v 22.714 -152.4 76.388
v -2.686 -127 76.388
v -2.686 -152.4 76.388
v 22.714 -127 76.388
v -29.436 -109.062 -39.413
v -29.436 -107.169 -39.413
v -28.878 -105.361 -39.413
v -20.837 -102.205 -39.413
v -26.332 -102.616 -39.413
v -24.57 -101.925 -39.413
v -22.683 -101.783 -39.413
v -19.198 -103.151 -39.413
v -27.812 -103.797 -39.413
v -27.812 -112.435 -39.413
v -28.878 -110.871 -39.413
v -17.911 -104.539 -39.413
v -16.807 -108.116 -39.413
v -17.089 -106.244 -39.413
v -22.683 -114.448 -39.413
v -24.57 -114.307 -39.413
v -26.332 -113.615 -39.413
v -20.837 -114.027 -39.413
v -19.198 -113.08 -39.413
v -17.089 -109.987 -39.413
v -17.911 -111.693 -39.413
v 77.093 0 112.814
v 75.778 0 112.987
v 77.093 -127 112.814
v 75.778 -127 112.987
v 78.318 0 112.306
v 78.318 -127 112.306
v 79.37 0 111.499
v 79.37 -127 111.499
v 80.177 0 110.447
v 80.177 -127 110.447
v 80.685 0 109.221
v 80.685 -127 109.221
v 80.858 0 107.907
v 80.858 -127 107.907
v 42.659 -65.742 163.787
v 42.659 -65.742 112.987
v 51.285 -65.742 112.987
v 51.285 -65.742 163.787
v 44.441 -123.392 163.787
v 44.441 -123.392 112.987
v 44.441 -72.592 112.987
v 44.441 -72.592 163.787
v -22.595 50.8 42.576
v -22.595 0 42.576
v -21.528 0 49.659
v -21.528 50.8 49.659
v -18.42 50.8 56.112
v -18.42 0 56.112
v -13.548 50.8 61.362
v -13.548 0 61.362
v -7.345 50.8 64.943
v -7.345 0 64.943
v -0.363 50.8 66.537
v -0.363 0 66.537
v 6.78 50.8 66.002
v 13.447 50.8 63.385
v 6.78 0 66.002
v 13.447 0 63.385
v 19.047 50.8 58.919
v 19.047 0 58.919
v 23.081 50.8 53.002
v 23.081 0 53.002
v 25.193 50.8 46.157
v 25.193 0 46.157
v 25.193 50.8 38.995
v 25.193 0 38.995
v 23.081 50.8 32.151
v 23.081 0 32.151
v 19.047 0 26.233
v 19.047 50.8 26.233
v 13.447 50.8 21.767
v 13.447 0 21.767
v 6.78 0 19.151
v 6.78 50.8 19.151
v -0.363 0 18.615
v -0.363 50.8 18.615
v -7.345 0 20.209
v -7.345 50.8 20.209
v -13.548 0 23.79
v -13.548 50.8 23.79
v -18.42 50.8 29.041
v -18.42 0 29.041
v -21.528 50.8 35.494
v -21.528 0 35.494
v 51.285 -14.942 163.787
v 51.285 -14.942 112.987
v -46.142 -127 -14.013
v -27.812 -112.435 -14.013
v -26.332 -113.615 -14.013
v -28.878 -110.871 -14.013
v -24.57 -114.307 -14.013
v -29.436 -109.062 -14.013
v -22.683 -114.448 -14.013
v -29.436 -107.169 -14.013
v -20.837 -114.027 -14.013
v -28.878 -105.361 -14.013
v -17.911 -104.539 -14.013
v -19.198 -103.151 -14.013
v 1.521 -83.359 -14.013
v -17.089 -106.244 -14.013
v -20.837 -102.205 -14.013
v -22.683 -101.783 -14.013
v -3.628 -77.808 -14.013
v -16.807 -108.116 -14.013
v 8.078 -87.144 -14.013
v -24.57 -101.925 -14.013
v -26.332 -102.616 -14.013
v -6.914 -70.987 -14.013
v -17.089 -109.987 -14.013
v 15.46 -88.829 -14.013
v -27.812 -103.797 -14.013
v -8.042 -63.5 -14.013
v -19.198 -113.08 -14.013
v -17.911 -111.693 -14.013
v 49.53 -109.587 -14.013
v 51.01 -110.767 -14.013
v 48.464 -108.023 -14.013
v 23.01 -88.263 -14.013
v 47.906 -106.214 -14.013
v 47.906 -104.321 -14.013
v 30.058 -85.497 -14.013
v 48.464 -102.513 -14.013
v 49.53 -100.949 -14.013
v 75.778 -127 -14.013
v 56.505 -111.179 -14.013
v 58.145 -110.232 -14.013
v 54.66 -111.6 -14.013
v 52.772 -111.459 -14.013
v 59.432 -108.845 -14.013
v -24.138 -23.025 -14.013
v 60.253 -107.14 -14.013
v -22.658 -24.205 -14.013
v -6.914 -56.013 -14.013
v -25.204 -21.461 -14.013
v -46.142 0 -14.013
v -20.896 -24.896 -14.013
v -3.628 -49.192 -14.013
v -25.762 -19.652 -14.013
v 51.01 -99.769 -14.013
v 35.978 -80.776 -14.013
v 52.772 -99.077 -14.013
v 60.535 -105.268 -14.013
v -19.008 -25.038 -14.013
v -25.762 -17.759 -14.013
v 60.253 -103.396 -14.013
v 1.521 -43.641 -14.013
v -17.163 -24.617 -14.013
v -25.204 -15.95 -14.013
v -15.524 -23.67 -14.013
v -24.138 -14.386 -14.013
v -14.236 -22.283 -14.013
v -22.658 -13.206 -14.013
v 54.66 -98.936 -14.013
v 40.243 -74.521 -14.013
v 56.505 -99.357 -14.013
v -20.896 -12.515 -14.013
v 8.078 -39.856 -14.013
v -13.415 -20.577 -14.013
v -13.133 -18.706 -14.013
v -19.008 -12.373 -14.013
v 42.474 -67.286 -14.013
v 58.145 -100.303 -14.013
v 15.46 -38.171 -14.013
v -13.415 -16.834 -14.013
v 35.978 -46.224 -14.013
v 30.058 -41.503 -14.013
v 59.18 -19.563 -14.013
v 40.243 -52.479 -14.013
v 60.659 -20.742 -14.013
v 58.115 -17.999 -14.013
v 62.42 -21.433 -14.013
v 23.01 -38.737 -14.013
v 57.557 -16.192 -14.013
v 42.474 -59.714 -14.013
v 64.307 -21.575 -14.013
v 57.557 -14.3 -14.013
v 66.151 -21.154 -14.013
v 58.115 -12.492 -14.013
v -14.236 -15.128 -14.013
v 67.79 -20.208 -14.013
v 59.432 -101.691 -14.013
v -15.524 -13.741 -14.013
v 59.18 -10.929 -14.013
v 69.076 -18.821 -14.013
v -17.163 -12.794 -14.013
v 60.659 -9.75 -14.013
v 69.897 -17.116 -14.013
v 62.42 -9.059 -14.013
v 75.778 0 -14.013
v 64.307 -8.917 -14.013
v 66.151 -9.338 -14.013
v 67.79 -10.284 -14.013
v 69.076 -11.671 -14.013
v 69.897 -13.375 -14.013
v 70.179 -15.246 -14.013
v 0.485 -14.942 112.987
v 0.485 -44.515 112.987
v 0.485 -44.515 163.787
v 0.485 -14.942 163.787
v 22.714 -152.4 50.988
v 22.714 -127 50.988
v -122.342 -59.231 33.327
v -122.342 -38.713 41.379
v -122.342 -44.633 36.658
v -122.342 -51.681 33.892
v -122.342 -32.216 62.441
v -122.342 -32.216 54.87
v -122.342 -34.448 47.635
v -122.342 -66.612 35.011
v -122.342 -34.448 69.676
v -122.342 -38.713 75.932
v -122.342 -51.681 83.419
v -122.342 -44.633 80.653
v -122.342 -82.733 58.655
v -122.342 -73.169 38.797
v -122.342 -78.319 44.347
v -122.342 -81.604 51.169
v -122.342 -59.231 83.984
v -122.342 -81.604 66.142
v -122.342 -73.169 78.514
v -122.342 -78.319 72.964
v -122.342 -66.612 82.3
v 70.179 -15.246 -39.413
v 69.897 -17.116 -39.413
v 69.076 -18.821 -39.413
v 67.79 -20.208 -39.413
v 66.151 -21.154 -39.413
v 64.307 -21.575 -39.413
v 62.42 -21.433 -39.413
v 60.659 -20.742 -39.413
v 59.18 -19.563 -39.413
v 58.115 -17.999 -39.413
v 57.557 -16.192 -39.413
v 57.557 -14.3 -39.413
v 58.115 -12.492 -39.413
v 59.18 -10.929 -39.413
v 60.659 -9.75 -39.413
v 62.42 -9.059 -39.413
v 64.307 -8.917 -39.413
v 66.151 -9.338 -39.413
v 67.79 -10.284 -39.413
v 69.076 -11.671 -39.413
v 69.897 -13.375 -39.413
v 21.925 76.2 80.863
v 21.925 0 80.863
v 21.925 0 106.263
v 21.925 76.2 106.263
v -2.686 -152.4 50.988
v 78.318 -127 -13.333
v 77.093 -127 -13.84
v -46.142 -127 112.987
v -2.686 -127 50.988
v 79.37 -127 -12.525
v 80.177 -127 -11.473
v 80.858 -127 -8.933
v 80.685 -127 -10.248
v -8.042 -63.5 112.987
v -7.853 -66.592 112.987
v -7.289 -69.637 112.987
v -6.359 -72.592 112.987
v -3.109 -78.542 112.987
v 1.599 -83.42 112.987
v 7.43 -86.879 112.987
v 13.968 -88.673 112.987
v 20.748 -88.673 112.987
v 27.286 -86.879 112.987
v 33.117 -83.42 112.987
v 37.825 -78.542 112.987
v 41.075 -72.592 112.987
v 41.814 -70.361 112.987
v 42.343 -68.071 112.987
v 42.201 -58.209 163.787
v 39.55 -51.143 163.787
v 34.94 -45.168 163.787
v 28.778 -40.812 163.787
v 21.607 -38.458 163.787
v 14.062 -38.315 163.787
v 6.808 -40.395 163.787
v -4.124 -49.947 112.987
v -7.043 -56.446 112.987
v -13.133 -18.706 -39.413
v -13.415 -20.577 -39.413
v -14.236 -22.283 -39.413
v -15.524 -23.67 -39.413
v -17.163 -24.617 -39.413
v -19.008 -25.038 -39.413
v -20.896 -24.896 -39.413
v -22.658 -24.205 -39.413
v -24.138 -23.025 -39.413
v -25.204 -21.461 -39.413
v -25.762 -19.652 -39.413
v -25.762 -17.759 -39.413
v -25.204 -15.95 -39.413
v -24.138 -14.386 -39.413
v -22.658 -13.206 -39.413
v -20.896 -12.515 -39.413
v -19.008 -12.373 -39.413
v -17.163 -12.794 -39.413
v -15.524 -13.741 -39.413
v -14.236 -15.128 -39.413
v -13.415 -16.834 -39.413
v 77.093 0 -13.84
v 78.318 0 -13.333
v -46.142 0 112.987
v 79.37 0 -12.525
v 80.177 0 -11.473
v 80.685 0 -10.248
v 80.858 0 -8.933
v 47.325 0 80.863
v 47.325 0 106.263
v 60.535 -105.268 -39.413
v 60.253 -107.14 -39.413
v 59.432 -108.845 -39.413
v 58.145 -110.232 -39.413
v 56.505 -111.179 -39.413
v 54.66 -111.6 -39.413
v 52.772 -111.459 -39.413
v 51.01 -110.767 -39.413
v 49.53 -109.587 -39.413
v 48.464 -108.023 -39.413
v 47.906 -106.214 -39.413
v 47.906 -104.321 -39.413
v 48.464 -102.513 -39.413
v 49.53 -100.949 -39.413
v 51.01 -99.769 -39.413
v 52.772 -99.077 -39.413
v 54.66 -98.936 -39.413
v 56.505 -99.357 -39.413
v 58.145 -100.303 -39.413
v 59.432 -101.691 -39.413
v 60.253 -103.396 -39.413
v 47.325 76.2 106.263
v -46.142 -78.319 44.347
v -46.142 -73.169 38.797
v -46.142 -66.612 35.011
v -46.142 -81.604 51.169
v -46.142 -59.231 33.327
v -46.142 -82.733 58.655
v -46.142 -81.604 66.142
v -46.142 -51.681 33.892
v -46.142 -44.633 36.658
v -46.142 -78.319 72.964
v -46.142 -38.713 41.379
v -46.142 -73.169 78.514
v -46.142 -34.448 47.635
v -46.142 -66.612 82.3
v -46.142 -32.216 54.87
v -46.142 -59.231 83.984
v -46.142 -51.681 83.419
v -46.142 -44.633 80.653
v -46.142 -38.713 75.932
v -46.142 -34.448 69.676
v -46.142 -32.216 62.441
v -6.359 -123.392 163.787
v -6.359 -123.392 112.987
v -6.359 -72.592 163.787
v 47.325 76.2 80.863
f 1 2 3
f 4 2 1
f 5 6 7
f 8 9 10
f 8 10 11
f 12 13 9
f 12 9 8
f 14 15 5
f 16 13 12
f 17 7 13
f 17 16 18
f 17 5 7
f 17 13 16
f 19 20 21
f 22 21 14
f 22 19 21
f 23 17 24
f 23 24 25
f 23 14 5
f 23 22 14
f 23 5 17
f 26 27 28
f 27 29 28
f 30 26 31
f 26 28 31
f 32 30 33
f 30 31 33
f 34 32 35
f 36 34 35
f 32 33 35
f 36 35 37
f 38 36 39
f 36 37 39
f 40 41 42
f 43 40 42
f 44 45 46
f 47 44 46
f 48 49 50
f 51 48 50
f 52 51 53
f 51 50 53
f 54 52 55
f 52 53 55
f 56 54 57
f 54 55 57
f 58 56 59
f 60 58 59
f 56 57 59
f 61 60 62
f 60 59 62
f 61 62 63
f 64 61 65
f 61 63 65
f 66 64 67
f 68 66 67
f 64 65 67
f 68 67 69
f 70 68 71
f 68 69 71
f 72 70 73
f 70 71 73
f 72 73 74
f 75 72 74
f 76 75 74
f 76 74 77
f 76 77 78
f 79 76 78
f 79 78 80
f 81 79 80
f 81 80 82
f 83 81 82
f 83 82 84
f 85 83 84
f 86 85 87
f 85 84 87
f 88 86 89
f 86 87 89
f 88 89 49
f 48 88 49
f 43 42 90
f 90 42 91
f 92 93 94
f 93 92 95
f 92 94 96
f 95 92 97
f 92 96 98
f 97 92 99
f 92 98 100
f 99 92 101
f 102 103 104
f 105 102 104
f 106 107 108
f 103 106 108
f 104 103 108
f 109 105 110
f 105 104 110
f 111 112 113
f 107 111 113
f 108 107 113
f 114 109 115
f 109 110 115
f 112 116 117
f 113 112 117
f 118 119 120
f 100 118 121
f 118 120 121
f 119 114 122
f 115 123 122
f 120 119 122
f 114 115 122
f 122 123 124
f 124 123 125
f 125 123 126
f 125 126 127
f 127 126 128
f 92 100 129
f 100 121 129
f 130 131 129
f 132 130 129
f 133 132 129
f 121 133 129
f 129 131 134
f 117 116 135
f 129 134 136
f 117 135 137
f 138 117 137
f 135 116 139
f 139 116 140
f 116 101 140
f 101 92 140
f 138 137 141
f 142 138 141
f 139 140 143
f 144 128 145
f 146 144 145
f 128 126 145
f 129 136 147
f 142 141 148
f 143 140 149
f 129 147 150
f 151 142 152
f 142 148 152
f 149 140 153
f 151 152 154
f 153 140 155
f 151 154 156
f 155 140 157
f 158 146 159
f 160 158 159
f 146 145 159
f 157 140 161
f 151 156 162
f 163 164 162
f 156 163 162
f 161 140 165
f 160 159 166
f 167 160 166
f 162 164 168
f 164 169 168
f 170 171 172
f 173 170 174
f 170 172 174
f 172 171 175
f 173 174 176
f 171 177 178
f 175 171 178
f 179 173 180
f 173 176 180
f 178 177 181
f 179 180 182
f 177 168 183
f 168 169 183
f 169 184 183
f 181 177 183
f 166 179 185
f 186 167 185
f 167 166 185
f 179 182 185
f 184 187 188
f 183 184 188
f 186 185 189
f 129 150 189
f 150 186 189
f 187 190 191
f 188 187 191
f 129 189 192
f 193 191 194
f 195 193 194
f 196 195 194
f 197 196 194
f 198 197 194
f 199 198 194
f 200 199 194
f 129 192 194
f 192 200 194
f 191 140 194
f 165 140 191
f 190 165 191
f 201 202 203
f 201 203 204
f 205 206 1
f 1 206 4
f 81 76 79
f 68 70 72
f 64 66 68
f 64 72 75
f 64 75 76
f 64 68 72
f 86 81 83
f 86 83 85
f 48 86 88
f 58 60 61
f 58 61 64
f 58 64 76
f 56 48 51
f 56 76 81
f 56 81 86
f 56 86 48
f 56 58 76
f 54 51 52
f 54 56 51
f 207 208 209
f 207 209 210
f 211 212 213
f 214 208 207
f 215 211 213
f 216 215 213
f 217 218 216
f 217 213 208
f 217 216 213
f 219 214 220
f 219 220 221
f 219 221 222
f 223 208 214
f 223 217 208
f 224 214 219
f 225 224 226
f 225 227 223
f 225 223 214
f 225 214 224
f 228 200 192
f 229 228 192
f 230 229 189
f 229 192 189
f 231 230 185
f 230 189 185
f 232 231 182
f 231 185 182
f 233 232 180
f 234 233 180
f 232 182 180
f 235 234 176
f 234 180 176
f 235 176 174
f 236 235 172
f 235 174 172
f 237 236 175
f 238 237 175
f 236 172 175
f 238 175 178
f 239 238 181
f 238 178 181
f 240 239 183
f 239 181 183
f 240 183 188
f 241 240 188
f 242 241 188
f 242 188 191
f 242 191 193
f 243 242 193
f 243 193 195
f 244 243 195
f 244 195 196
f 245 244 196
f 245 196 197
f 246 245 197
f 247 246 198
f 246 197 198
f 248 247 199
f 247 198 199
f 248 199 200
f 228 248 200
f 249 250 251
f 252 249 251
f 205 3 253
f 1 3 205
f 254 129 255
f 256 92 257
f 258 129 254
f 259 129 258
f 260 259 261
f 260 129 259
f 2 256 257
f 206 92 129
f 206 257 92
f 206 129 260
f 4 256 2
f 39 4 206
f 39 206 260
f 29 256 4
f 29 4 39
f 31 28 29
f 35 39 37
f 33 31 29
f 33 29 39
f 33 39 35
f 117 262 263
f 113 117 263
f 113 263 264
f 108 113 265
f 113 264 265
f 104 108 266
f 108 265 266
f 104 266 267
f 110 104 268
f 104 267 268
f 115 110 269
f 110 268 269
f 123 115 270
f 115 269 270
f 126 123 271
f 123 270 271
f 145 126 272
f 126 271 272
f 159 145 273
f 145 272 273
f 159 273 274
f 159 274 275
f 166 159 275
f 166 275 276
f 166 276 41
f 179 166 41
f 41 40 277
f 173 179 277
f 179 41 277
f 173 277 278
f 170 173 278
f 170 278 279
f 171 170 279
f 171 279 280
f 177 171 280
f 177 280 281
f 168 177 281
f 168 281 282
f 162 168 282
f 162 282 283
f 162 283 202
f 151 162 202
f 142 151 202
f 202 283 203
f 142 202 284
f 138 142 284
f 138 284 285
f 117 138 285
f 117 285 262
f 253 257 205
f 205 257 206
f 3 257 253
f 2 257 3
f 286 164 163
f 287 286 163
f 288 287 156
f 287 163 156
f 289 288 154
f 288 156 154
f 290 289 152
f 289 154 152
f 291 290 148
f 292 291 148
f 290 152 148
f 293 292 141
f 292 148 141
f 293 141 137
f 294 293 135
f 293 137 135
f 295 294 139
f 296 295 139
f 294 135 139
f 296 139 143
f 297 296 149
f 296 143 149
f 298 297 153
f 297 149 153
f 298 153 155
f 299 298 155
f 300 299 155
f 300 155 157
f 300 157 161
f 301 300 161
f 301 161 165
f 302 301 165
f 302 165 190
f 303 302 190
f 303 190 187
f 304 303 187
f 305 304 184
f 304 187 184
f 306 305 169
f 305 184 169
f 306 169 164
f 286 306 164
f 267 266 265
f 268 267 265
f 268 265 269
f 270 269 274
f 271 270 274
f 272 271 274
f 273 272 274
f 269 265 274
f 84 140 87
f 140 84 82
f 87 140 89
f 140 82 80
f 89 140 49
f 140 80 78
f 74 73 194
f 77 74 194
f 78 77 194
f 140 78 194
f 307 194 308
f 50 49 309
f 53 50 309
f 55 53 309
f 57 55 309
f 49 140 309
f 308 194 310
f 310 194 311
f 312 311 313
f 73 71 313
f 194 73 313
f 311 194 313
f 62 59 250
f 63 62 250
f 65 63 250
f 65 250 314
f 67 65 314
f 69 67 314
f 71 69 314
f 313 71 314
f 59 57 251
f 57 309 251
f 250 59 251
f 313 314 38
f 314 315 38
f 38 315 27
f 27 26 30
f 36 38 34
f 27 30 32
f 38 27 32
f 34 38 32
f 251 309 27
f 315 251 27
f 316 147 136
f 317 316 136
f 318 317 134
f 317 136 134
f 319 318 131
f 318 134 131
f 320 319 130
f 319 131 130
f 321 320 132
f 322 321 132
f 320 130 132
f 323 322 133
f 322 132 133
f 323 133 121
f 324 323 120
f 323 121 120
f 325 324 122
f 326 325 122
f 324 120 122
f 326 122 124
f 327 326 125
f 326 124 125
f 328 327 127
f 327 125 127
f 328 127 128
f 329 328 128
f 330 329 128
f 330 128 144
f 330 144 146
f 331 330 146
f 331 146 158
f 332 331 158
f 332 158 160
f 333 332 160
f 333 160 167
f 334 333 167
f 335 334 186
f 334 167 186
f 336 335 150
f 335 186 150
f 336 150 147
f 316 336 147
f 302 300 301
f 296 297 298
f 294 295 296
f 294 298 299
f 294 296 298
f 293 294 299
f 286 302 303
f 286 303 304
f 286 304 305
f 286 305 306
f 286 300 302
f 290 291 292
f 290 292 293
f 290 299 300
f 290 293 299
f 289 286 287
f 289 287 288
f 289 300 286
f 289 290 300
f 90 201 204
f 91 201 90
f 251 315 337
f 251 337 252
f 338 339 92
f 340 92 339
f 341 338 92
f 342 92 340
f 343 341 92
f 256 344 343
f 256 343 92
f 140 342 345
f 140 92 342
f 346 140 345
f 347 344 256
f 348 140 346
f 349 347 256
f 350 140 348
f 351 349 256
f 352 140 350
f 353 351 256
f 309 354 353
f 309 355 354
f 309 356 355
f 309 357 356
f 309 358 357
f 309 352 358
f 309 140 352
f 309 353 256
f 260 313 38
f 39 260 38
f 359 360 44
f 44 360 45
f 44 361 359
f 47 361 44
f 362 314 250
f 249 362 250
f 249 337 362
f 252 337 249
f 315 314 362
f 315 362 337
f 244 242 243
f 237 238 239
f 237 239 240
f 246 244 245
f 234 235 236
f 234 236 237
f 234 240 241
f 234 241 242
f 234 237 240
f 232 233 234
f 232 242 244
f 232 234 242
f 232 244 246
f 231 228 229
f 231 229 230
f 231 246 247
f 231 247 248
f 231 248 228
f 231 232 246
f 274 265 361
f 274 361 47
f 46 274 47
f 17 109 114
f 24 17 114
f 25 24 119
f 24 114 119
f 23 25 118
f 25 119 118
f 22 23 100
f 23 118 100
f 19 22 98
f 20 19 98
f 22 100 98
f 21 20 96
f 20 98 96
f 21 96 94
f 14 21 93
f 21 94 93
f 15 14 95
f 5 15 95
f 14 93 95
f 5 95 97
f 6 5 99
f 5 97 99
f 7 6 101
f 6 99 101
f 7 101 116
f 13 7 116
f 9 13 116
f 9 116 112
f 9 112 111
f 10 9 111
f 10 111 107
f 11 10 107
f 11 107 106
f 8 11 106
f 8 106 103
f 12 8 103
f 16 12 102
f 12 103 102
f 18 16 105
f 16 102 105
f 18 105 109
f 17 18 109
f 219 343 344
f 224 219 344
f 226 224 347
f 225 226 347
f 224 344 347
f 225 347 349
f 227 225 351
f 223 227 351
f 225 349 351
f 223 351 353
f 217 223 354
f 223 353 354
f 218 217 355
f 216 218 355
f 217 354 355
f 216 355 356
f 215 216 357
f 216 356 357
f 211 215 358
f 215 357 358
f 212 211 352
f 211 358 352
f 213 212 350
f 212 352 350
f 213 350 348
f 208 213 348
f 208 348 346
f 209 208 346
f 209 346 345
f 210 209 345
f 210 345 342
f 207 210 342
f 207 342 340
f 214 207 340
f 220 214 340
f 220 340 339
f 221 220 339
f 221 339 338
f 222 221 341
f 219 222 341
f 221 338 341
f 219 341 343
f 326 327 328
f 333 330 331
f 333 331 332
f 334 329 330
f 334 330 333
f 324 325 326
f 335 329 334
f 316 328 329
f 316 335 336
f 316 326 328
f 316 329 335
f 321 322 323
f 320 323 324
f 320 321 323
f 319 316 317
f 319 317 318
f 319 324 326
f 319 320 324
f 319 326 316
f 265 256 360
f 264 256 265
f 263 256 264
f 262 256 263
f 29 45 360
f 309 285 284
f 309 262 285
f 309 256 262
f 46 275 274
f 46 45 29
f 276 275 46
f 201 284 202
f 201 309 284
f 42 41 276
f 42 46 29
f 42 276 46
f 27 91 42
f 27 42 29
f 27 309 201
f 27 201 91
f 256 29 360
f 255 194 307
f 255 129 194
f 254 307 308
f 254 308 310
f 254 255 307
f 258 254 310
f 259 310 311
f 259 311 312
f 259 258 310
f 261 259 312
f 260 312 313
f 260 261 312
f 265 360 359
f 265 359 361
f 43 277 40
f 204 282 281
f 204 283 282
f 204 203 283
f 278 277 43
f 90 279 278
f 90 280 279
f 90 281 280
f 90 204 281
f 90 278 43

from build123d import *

# Parameters (mm, degrees)
F0_W      = 127
F0_H      = 127
F1_DEPTH  = 127
F2_W      = 50.8
F2_H      = 50.8
F3_DEPTH  = 50.8
F4_R      = 25.4
F5_DEPTH  = 76.2
F6_R      = 24.028023
F7_DEPTH  = 50.8
F8_W      = 25.4
F8_H      = 25.4
F9_DEPTH  = 76.2
F11_D     = 50.8
F12_R     = 5.08
F13_W     = 25.4
F13_H     = 25.4
F14_DEPTH = 25.4
F15_R     = 6.35
F17_DEPTH = 25.4
F18_R     = 6.35
F19_DEPTH = 25.4
F20_R     = 6.35
F21_DEPTH = 25.4
F22_R     = 6.346464
F23_DEPTH = 25.4
F24_W     = 50.8
F24_H     = 50.8
F25_DEPTH = 50.8


with BuildPart() as f1:
    # F0 (on Front) → F1 (new body)
    with BuildSketch(Plane.XZ):
        with Locations((17.358025, 49.486642)):
            Rectangle(F0_W, F0_H)
    extrude(amount=F1_DEPTH)

    # F2 (on face) → F3 (join)
    with BuildSketch(Plane.XY.offset(112.986642)):
        with Locations((25.884503, -40.341979)):
            Rectangle(F2_W, F2_H)
    extrude(amount=F3_DEPTH)

    # F4 (on face) → F5 (join)
    with BuildSketch(Plane(origin=(-46.141975, 0, 0), x_dir=(0, -1, 0), z_dir=(-1, 0, 0))):
        with Locations((57.332661, 58.655478)):
            Circle(F4_R)
    extrude(amount=F5_DEPTH)

    # F6 (on face) → F7 (join)
    with BuildSketch(Plane(origin=(0, 0, 0), x_dir=(-1, 0, 0), z_dir=(0, 1, 0))):
        with Locations((-1.432957, 42.57629)):
            Circle(F6_R)
    extrude(amount=F7_DEPTH)

    # F8 (on face) → F9 (join)
    with BuildSketch(Plane(origin=(0, 0, 0), x_dir=(-1, 0, 0), z_dir=(0, 1, 0))):
        with Locations((-34.625011, 93.562656)):
            Rectangle(F8_W, F8_H)
    extrude(amount=F9_DEPTH)

    # F11 (through all)
    with Locations(Plane(origin=(0, 0, -14.013358), x_dir=(1, 0, 0), z_dir=(0, 0, -1))):
        with Locations((17.358025, 63.5)):
            Hole(F11_D / 2)

    # F12
    f12_edges = [f1.edges().sort_by_distance(p)[0] for p in [
        (80.858025, -63.5, -14.013358),
        (80.858025, -63.5, 112.986642),
    ]]
    fillet(f12_edges, radius=F12_R)

    # F13 (on face) → F14 (join)
    with BuildSketch(Plane.XZ.offset(127)):
        with Locations((10.013793, 63.688007)):
            Rectangle(F13_W, F13_H)
    extrude(amount=F14_DEPTH)

    # F15 (on face) → F17 (join)
    with BuildSketch(Plane(origin=(0, 0, -14.013358), x_dir=(1, 0, 0), z_dir=(0, 0, -1))):
        with Locations((-19.482944, 18.705502)):
            Circle(F15_R)
    extrude(amount=F17_DEPTH)

    # F18 (on face) → F19 (join)
    with BuildSketch(Plane(origin=(0, 0, -14.013358), x_dir=(1, 0, 0), z_dir=(0, 0, -1))):
        with Locations((54.185353, 105.267808)):
            Circle(F18_R)
    extrude(amount=F19_DEPTH)

    # F20 (on face) → F21 (join)
    with BuildSketch(Plane(origin=(0, 0, -14.013358), x_dir=(1, 0, 0), z_dir=(0, 0, -1))):
        with Locations((-23.157163, 108.115725)):
            Circle(F20_R)
    extrude(amount=F21_DEPTH)

    # F22 (on face) → F23 (join)
    with BuildSketch(Plane(origin=(0, 0, -14.013358), x_dir=(1, 0, 0), z_dir=(0, 0, -1))):
        with Locations((63.832581, 15.245846)):
            Circle(F22_R)
    extrude(amount=F23_DEPTH)

    # F24 (on face) → F25 (join)
    with BuildSketch(Plane.XY.offset(112.986642)):
        with Locations((19.040968, -97.99182)):
            Rectangle(F24_W, F24_H)
    extrude(amount=F25_DEPTH)


solid = f1.part
